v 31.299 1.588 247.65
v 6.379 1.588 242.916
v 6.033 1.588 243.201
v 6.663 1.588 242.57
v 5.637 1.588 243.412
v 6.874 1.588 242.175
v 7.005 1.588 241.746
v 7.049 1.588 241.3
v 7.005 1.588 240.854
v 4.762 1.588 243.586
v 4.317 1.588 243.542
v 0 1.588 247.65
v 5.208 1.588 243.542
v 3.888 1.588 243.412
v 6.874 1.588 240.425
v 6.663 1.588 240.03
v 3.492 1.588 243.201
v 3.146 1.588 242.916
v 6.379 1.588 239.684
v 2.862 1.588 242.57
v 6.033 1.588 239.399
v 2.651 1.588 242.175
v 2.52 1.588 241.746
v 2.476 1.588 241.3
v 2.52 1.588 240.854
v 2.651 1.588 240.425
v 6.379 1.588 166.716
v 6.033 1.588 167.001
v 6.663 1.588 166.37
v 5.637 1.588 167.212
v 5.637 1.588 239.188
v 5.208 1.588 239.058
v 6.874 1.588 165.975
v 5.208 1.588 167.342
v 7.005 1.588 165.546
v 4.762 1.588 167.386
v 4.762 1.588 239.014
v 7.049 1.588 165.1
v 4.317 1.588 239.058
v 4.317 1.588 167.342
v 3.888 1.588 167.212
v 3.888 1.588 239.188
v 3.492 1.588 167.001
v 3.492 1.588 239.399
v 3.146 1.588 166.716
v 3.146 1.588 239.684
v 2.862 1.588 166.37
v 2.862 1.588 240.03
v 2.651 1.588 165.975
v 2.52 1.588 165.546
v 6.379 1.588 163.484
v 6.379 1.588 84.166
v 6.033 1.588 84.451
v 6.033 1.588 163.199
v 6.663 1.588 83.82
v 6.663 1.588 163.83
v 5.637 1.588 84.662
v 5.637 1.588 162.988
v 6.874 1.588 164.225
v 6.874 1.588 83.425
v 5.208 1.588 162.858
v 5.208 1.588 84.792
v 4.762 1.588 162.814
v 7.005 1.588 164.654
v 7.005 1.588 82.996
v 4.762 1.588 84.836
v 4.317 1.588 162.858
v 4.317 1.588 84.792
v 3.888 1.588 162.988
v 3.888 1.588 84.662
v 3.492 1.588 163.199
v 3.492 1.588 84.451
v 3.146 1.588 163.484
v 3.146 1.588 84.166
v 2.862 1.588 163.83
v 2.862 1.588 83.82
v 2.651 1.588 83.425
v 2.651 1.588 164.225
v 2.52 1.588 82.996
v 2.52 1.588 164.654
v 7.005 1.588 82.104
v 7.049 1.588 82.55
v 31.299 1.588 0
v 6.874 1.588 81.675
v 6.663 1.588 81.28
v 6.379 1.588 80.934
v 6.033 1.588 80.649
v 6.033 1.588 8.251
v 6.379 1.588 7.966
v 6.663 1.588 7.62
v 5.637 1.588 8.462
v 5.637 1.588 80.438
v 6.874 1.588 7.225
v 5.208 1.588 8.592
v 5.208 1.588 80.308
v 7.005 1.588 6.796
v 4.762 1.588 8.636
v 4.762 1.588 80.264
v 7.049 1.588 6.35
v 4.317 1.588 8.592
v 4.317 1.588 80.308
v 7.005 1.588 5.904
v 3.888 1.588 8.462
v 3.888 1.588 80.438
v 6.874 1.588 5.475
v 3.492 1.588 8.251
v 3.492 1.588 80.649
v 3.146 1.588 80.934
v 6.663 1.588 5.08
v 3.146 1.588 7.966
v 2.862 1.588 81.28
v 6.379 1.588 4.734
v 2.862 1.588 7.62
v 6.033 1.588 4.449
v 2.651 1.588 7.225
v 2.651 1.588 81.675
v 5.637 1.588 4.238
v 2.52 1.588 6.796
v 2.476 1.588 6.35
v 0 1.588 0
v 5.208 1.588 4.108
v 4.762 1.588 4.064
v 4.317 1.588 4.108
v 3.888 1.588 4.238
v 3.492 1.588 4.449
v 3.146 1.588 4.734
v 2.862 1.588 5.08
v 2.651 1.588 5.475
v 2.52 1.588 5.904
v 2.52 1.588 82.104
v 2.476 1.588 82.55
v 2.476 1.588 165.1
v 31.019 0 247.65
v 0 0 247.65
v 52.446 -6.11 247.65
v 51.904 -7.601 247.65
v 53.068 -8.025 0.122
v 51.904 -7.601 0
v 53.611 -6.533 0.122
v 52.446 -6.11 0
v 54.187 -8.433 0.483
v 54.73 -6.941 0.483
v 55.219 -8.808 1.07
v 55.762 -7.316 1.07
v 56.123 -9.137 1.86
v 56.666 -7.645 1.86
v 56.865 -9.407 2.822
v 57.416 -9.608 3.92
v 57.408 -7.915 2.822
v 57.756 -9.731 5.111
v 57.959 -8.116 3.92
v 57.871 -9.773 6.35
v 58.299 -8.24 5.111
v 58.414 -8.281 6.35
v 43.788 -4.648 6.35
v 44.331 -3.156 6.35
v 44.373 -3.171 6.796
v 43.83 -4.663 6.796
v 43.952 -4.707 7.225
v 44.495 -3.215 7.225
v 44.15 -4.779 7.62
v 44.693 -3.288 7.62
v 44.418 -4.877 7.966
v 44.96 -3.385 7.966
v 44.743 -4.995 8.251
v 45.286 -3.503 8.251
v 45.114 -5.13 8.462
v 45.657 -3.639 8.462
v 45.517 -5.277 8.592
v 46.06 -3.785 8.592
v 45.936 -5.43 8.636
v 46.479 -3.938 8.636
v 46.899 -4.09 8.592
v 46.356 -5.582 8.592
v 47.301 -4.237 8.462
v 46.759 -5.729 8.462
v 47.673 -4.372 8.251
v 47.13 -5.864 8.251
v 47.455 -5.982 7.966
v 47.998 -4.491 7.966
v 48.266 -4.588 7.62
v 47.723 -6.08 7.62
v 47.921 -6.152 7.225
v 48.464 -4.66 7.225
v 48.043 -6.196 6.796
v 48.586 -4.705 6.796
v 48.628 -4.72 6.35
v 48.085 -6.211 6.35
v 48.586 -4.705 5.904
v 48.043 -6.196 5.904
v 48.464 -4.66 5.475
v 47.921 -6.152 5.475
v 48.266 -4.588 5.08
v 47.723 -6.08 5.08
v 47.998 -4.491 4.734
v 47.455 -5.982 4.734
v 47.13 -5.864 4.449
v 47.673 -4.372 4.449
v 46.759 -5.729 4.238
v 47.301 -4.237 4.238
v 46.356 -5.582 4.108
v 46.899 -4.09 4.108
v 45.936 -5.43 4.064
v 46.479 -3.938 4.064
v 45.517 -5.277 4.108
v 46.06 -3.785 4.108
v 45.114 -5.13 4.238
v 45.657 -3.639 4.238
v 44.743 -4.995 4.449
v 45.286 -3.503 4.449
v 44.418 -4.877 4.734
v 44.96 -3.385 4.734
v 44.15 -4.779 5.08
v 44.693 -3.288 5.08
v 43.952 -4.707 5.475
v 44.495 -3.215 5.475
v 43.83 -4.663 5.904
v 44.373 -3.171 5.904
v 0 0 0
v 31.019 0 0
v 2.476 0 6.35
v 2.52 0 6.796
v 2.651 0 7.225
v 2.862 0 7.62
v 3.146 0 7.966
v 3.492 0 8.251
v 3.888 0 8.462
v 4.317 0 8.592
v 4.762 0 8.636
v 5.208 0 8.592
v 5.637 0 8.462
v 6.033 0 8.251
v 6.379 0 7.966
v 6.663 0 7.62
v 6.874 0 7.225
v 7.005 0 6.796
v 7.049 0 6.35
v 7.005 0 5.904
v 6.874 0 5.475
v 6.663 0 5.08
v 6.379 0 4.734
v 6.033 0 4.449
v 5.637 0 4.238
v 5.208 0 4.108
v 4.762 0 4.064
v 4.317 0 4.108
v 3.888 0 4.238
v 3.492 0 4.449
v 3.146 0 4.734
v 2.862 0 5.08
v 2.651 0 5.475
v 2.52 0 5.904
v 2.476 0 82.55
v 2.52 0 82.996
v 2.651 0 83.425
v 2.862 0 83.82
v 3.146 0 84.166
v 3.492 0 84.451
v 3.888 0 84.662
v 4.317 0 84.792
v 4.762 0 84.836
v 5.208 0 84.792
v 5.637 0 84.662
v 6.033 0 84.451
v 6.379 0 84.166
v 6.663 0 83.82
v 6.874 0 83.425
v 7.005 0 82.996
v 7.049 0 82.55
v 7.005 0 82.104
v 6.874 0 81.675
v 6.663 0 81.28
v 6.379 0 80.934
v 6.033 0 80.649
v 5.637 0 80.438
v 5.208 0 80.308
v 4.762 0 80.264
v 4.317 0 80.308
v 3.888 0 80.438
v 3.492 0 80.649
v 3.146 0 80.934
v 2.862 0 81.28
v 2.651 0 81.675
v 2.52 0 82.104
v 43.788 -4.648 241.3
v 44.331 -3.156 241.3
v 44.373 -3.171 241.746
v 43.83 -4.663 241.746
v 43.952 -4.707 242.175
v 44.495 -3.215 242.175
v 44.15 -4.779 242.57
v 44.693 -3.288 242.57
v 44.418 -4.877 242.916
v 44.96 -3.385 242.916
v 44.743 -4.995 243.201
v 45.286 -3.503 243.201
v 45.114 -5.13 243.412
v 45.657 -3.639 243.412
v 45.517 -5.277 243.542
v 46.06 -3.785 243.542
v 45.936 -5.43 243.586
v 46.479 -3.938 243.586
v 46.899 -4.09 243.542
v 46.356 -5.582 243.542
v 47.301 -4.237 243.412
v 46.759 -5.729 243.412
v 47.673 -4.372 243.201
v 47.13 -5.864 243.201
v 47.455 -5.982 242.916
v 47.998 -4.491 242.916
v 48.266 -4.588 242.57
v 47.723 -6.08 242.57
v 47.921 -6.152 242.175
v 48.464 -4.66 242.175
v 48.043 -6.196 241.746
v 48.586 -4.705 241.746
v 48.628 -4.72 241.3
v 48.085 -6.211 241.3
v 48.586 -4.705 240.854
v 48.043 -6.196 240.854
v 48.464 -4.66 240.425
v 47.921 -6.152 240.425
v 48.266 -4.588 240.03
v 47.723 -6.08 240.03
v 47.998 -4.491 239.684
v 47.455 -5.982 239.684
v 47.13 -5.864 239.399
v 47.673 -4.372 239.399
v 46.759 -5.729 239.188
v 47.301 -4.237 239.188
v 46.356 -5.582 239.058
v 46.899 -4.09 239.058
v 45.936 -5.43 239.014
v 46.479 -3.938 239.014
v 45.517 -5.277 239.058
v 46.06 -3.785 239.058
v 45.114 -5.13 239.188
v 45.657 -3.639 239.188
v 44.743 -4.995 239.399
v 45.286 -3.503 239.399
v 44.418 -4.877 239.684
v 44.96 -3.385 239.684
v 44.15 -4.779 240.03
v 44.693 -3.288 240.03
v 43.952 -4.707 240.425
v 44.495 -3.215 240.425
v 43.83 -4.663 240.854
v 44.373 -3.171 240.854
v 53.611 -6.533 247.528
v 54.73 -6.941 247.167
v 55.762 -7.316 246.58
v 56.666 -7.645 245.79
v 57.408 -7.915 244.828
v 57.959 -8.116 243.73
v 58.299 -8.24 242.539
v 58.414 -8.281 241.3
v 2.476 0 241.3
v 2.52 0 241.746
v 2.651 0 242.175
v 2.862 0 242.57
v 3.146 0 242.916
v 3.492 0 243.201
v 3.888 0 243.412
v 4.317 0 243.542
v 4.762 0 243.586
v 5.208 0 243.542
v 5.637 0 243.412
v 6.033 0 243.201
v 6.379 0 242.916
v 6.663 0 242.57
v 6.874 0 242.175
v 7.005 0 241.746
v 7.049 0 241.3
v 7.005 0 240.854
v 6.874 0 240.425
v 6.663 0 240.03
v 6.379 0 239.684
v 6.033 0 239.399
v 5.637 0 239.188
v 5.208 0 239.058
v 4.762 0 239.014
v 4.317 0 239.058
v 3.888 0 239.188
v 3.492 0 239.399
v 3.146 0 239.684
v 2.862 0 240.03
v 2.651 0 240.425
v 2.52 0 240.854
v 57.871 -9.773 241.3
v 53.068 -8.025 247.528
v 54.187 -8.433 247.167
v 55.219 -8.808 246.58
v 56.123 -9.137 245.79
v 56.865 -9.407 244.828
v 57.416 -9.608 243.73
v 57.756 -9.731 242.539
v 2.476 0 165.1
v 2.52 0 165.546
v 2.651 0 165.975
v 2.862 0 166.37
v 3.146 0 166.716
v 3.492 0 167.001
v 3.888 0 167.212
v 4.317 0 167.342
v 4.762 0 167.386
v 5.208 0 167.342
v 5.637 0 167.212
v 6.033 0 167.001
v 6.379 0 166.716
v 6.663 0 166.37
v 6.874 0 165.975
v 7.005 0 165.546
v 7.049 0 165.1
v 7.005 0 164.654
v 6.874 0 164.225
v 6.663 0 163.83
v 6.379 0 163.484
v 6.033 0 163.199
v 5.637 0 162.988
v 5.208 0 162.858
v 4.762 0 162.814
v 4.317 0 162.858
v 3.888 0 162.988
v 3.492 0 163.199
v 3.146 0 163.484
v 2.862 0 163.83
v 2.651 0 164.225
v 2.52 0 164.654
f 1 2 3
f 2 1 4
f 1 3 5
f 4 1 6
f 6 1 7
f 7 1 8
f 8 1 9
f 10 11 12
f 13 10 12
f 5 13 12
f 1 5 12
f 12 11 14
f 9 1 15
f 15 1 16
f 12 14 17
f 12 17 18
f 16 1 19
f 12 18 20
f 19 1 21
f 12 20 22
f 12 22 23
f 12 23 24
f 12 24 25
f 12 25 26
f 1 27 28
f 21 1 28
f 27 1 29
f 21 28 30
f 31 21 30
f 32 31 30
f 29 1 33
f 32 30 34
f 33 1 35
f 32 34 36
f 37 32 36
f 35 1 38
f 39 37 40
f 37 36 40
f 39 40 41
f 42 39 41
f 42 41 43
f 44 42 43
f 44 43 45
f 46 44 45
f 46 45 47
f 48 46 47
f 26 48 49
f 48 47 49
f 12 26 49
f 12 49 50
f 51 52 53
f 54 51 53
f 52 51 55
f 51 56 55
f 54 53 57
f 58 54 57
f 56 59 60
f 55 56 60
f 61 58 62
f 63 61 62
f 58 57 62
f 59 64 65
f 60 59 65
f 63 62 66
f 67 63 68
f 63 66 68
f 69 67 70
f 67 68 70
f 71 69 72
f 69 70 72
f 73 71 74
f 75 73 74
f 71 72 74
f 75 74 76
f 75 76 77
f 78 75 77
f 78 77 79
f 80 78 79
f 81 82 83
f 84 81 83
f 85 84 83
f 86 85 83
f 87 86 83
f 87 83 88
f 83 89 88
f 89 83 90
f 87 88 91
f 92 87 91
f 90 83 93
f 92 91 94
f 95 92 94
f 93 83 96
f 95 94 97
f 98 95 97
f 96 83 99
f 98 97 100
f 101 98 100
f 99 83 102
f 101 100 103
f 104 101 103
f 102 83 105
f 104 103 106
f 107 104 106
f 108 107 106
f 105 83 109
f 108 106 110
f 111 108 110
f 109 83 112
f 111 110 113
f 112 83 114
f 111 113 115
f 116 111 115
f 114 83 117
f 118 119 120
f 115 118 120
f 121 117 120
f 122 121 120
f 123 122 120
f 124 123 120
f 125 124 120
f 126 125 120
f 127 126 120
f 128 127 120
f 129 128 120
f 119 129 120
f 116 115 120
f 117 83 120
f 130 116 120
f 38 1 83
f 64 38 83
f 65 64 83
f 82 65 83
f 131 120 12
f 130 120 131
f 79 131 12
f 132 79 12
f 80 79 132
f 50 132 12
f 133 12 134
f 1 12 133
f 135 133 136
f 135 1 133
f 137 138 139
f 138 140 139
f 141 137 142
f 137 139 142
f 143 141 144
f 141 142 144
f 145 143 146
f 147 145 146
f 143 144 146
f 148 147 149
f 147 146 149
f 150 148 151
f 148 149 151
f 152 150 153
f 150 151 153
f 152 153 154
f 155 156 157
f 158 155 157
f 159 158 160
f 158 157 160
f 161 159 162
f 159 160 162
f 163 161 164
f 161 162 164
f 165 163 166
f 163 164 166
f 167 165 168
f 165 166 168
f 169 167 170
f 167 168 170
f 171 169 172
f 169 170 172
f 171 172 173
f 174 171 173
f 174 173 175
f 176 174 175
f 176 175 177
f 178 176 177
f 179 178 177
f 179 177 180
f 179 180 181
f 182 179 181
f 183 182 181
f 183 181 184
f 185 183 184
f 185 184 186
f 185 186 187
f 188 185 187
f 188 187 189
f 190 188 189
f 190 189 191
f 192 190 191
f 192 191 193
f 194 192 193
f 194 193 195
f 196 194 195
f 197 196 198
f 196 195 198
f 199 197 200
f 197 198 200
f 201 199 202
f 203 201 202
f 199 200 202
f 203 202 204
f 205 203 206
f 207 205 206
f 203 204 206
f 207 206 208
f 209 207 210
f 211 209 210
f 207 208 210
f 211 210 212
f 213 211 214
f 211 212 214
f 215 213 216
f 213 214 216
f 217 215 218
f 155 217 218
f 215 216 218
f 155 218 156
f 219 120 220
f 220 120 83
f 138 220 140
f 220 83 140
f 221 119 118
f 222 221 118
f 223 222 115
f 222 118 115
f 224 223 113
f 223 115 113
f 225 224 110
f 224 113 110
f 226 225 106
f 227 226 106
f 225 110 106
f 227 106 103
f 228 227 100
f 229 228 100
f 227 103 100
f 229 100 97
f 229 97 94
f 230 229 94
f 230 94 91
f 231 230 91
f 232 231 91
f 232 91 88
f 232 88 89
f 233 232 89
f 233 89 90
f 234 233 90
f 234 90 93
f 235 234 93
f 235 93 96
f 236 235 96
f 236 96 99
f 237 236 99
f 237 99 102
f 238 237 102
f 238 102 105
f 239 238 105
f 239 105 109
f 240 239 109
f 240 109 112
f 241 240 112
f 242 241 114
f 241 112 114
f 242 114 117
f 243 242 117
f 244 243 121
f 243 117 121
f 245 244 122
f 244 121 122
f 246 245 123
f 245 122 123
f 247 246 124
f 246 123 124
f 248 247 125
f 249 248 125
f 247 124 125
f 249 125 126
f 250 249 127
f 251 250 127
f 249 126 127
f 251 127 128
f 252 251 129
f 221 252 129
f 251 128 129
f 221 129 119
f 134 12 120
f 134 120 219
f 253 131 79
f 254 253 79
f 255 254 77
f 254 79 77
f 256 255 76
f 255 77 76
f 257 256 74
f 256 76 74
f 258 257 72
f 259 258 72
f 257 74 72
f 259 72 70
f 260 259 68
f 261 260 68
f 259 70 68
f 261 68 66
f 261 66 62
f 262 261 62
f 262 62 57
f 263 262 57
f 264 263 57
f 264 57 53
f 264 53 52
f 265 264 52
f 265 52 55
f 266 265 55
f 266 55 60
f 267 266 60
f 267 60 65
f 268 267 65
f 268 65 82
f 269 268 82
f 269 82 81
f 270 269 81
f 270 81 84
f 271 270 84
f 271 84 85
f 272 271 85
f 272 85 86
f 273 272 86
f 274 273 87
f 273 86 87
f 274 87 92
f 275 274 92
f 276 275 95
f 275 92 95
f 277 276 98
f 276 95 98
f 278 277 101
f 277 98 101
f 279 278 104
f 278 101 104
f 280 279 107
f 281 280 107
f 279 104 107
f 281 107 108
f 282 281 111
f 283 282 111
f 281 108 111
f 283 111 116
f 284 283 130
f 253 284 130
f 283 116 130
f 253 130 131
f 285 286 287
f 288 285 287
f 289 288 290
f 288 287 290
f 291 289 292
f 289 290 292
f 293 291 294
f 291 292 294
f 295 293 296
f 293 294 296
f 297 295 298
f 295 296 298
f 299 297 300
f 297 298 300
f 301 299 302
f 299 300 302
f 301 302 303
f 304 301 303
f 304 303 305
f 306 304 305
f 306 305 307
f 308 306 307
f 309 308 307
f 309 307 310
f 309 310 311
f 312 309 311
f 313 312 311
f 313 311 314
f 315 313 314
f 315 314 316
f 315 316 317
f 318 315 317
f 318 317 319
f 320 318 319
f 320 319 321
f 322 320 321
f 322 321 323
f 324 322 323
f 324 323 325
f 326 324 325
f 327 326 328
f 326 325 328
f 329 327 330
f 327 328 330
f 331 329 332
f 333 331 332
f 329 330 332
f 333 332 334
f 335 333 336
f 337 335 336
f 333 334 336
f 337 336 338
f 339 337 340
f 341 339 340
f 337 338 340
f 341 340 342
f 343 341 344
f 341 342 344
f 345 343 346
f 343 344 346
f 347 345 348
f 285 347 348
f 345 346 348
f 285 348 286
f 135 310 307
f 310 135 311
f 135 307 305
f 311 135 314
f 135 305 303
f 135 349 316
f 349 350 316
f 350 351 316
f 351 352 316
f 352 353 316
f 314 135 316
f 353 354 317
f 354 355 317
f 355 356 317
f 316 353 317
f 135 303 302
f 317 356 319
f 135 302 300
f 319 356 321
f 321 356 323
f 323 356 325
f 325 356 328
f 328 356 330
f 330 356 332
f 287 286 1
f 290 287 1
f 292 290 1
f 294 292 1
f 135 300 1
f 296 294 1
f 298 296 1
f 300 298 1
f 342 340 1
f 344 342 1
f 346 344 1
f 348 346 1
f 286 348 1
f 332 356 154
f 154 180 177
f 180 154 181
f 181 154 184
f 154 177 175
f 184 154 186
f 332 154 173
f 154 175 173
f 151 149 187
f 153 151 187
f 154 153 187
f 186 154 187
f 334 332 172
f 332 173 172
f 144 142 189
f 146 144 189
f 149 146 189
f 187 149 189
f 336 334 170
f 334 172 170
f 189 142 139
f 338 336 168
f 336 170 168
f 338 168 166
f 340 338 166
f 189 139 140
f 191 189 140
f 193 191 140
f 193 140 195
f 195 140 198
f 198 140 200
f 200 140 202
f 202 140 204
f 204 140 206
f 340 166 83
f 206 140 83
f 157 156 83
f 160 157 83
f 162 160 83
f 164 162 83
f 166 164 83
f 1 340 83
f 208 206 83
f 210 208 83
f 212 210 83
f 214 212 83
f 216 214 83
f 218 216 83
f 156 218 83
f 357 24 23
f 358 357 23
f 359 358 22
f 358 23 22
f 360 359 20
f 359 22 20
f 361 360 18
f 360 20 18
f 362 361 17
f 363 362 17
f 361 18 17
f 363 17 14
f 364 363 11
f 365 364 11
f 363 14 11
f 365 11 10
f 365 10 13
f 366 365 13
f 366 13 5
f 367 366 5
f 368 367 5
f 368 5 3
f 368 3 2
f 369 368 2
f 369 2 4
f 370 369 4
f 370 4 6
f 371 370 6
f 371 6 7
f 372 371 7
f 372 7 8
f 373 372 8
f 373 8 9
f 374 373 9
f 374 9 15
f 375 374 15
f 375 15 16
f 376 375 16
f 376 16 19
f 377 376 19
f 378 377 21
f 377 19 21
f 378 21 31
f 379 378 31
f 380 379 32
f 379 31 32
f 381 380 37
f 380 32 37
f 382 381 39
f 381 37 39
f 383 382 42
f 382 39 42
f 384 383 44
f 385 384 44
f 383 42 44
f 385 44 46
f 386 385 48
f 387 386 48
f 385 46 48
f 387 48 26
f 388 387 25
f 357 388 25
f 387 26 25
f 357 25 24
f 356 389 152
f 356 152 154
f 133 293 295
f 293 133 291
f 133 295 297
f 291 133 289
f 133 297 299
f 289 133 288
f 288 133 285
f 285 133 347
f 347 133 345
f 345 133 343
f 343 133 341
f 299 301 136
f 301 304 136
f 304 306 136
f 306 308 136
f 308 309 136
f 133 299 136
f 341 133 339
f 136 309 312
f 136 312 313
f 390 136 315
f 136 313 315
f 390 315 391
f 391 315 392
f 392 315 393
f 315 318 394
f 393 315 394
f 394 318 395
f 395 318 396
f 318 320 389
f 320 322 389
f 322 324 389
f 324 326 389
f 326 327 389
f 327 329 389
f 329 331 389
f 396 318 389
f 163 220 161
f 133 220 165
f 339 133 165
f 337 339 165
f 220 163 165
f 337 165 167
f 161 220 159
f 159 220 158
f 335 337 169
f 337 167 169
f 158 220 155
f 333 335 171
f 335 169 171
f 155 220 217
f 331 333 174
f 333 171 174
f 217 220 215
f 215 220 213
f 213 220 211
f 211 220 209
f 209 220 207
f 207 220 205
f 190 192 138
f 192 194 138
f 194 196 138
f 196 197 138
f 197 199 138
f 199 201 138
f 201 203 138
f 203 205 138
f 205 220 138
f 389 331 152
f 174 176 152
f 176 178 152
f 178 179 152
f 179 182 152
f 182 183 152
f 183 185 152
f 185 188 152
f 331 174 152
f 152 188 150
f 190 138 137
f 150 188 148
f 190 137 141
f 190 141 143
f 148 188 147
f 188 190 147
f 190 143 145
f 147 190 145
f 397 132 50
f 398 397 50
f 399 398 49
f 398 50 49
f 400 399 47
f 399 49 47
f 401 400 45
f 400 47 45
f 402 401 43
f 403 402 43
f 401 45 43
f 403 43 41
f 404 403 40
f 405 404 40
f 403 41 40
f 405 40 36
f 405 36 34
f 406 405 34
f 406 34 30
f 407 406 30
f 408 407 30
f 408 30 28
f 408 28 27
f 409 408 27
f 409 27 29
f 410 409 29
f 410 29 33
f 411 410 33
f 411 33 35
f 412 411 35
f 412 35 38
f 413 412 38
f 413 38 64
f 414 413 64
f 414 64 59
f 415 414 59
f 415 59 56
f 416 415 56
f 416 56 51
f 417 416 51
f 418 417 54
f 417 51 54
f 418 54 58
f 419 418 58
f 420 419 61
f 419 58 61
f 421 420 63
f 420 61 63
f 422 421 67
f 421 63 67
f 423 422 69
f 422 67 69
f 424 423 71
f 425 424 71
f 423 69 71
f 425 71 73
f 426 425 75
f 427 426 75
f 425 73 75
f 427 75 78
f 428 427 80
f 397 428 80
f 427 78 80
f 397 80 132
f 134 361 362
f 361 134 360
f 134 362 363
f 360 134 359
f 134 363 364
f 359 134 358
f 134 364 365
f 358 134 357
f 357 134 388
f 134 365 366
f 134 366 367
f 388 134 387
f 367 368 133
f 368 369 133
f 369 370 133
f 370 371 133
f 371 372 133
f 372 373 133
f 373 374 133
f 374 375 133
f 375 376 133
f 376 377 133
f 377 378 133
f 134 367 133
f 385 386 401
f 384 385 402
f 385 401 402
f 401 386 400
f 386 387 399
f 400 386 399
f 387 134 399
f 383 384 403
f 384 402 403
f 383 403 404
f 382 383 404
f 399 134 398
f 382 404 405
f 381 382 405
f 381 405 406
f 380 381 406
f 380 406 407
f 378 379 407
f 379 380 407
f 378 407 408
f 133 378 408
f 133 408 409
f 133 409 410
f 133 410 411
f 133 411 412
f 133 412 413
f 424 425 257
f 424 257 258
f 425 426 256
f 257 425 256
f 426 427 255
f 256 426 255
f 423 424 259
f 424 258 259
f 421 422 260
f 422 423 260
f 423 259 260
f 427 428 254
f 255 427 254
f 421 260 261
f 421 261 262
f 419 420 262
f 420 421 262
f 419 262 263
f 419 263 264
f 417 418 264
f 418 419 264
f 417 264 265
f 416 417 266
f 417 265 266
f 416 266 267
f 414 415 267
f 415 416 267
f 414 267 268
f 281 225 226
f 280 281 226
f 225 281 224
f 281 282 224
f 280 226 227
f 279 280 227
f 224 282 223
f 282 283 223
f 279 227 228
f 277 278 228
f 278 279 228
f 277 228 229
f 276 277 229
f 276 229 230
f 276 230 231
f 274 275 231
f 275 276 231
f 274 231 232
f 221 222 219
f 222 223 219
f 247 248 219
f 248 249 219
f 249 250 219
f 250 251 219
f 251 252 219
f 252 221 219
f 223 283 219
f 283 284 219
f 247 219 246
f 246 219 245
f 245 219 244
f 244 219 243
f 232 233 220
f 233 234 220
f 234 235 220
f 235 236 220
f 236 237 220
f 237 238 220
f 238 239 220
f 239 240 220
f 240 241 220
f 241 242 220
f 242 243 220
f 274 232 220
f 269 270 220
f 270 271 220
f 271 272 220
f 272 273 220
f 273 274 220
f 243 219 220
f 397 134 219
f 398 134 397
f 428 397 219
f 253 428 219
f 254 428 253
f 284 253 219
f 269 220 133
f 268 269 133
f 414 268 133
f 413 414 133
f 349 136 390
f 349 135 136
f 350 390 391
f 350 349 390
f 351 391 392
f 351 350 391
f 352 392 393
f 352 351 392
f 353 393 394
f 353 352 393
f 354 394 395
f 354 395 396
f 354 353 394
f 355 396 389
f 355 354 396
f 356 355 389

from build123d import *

# Parameters (mm, degrees)
BOSS_EXTRUDE1_DEPTH = 247.65
SKETCH2_R           = 2.286
CUT_EXTRUDE1_DEPTH  = 255.69929163
SKETCH3_R           = 2.286
CUT_EXTRUDE2_DEPTH  = 255.408366321
FILLET1_R           = 6.35


with BuildPart() as part:
    # Sketch1 → Boss-Extrude1 (new body)
    with BuildSketch(Plane.XY):
        Polygon((0, 0), (31.018857102, 0), (57.870573741, -9.773225596), (58.413530719, -8.28146356), (31.298776184, 1.5875), (0, 1.5875), align=None)
    extrude(amount=BOSS_EXTRUDE1_DEPTH)

    # Sketch2 → Cut-Extrude1 (cut, through all)
    with BuildSketch(Plane(origin=(0, 1.5875, 0), x_dir=(1, 0, 0), z_dir=(0, 1, 0))):
        with Locations(Location((4.7625, -6.35, 0), (0, 0, 180))):
            Circle(SKETCH2_R)
        with Locations(Location((4.7625, -241.3, 0), (0, 0, 180))):
            Circle(SKETCH2_R)
        with Locations(Location((4.7625, -82.55, 0), (0, 0, 180))):
            Circle(SKETCH2_R)
        with Locations(Location((4.7625, -165.1, 0), (0, 0, 180))):
            Circle(SKETCH2_R)
    extrude(amount=-CUT_EXTRUDE1_DEPTH, mode=Mode.SUBTRACT)

    # Sketch3 → Cut-Extrude2 (cut, through all)
    with BuildSketch(Plane(origin=(4.171473971, 11.461030541, 0), x_dir=(0.9396926207859064, -0.34202014332567426, 0), z_dir=(0.34202014332567426, 0.9396926207859064, 0))):
        with Locations(Location((45.023191124, -6.35, 0), (0, 0, 180))):
            Circle(SKETCH3_R)
        with Locations(Location((45.023191124, -241.3, 0), (0, 0, 180))):
            Circle(SKETCH3_R)
    extrude(amount=-CUT_EXTRUDE2_DEPTH, mode=Mode.SUBTRACT)

    # Fillet1
    fillet1_edges = [part.edges().sort_by_distance(p)[0] for p in [
        (58.14205223, -9.027344578, 0),
        (58.14205223, -9.027344578, 247.65),
    ]]
    fillet(fillet1_edges, radius=FILLET1_R)


solid = part.part
